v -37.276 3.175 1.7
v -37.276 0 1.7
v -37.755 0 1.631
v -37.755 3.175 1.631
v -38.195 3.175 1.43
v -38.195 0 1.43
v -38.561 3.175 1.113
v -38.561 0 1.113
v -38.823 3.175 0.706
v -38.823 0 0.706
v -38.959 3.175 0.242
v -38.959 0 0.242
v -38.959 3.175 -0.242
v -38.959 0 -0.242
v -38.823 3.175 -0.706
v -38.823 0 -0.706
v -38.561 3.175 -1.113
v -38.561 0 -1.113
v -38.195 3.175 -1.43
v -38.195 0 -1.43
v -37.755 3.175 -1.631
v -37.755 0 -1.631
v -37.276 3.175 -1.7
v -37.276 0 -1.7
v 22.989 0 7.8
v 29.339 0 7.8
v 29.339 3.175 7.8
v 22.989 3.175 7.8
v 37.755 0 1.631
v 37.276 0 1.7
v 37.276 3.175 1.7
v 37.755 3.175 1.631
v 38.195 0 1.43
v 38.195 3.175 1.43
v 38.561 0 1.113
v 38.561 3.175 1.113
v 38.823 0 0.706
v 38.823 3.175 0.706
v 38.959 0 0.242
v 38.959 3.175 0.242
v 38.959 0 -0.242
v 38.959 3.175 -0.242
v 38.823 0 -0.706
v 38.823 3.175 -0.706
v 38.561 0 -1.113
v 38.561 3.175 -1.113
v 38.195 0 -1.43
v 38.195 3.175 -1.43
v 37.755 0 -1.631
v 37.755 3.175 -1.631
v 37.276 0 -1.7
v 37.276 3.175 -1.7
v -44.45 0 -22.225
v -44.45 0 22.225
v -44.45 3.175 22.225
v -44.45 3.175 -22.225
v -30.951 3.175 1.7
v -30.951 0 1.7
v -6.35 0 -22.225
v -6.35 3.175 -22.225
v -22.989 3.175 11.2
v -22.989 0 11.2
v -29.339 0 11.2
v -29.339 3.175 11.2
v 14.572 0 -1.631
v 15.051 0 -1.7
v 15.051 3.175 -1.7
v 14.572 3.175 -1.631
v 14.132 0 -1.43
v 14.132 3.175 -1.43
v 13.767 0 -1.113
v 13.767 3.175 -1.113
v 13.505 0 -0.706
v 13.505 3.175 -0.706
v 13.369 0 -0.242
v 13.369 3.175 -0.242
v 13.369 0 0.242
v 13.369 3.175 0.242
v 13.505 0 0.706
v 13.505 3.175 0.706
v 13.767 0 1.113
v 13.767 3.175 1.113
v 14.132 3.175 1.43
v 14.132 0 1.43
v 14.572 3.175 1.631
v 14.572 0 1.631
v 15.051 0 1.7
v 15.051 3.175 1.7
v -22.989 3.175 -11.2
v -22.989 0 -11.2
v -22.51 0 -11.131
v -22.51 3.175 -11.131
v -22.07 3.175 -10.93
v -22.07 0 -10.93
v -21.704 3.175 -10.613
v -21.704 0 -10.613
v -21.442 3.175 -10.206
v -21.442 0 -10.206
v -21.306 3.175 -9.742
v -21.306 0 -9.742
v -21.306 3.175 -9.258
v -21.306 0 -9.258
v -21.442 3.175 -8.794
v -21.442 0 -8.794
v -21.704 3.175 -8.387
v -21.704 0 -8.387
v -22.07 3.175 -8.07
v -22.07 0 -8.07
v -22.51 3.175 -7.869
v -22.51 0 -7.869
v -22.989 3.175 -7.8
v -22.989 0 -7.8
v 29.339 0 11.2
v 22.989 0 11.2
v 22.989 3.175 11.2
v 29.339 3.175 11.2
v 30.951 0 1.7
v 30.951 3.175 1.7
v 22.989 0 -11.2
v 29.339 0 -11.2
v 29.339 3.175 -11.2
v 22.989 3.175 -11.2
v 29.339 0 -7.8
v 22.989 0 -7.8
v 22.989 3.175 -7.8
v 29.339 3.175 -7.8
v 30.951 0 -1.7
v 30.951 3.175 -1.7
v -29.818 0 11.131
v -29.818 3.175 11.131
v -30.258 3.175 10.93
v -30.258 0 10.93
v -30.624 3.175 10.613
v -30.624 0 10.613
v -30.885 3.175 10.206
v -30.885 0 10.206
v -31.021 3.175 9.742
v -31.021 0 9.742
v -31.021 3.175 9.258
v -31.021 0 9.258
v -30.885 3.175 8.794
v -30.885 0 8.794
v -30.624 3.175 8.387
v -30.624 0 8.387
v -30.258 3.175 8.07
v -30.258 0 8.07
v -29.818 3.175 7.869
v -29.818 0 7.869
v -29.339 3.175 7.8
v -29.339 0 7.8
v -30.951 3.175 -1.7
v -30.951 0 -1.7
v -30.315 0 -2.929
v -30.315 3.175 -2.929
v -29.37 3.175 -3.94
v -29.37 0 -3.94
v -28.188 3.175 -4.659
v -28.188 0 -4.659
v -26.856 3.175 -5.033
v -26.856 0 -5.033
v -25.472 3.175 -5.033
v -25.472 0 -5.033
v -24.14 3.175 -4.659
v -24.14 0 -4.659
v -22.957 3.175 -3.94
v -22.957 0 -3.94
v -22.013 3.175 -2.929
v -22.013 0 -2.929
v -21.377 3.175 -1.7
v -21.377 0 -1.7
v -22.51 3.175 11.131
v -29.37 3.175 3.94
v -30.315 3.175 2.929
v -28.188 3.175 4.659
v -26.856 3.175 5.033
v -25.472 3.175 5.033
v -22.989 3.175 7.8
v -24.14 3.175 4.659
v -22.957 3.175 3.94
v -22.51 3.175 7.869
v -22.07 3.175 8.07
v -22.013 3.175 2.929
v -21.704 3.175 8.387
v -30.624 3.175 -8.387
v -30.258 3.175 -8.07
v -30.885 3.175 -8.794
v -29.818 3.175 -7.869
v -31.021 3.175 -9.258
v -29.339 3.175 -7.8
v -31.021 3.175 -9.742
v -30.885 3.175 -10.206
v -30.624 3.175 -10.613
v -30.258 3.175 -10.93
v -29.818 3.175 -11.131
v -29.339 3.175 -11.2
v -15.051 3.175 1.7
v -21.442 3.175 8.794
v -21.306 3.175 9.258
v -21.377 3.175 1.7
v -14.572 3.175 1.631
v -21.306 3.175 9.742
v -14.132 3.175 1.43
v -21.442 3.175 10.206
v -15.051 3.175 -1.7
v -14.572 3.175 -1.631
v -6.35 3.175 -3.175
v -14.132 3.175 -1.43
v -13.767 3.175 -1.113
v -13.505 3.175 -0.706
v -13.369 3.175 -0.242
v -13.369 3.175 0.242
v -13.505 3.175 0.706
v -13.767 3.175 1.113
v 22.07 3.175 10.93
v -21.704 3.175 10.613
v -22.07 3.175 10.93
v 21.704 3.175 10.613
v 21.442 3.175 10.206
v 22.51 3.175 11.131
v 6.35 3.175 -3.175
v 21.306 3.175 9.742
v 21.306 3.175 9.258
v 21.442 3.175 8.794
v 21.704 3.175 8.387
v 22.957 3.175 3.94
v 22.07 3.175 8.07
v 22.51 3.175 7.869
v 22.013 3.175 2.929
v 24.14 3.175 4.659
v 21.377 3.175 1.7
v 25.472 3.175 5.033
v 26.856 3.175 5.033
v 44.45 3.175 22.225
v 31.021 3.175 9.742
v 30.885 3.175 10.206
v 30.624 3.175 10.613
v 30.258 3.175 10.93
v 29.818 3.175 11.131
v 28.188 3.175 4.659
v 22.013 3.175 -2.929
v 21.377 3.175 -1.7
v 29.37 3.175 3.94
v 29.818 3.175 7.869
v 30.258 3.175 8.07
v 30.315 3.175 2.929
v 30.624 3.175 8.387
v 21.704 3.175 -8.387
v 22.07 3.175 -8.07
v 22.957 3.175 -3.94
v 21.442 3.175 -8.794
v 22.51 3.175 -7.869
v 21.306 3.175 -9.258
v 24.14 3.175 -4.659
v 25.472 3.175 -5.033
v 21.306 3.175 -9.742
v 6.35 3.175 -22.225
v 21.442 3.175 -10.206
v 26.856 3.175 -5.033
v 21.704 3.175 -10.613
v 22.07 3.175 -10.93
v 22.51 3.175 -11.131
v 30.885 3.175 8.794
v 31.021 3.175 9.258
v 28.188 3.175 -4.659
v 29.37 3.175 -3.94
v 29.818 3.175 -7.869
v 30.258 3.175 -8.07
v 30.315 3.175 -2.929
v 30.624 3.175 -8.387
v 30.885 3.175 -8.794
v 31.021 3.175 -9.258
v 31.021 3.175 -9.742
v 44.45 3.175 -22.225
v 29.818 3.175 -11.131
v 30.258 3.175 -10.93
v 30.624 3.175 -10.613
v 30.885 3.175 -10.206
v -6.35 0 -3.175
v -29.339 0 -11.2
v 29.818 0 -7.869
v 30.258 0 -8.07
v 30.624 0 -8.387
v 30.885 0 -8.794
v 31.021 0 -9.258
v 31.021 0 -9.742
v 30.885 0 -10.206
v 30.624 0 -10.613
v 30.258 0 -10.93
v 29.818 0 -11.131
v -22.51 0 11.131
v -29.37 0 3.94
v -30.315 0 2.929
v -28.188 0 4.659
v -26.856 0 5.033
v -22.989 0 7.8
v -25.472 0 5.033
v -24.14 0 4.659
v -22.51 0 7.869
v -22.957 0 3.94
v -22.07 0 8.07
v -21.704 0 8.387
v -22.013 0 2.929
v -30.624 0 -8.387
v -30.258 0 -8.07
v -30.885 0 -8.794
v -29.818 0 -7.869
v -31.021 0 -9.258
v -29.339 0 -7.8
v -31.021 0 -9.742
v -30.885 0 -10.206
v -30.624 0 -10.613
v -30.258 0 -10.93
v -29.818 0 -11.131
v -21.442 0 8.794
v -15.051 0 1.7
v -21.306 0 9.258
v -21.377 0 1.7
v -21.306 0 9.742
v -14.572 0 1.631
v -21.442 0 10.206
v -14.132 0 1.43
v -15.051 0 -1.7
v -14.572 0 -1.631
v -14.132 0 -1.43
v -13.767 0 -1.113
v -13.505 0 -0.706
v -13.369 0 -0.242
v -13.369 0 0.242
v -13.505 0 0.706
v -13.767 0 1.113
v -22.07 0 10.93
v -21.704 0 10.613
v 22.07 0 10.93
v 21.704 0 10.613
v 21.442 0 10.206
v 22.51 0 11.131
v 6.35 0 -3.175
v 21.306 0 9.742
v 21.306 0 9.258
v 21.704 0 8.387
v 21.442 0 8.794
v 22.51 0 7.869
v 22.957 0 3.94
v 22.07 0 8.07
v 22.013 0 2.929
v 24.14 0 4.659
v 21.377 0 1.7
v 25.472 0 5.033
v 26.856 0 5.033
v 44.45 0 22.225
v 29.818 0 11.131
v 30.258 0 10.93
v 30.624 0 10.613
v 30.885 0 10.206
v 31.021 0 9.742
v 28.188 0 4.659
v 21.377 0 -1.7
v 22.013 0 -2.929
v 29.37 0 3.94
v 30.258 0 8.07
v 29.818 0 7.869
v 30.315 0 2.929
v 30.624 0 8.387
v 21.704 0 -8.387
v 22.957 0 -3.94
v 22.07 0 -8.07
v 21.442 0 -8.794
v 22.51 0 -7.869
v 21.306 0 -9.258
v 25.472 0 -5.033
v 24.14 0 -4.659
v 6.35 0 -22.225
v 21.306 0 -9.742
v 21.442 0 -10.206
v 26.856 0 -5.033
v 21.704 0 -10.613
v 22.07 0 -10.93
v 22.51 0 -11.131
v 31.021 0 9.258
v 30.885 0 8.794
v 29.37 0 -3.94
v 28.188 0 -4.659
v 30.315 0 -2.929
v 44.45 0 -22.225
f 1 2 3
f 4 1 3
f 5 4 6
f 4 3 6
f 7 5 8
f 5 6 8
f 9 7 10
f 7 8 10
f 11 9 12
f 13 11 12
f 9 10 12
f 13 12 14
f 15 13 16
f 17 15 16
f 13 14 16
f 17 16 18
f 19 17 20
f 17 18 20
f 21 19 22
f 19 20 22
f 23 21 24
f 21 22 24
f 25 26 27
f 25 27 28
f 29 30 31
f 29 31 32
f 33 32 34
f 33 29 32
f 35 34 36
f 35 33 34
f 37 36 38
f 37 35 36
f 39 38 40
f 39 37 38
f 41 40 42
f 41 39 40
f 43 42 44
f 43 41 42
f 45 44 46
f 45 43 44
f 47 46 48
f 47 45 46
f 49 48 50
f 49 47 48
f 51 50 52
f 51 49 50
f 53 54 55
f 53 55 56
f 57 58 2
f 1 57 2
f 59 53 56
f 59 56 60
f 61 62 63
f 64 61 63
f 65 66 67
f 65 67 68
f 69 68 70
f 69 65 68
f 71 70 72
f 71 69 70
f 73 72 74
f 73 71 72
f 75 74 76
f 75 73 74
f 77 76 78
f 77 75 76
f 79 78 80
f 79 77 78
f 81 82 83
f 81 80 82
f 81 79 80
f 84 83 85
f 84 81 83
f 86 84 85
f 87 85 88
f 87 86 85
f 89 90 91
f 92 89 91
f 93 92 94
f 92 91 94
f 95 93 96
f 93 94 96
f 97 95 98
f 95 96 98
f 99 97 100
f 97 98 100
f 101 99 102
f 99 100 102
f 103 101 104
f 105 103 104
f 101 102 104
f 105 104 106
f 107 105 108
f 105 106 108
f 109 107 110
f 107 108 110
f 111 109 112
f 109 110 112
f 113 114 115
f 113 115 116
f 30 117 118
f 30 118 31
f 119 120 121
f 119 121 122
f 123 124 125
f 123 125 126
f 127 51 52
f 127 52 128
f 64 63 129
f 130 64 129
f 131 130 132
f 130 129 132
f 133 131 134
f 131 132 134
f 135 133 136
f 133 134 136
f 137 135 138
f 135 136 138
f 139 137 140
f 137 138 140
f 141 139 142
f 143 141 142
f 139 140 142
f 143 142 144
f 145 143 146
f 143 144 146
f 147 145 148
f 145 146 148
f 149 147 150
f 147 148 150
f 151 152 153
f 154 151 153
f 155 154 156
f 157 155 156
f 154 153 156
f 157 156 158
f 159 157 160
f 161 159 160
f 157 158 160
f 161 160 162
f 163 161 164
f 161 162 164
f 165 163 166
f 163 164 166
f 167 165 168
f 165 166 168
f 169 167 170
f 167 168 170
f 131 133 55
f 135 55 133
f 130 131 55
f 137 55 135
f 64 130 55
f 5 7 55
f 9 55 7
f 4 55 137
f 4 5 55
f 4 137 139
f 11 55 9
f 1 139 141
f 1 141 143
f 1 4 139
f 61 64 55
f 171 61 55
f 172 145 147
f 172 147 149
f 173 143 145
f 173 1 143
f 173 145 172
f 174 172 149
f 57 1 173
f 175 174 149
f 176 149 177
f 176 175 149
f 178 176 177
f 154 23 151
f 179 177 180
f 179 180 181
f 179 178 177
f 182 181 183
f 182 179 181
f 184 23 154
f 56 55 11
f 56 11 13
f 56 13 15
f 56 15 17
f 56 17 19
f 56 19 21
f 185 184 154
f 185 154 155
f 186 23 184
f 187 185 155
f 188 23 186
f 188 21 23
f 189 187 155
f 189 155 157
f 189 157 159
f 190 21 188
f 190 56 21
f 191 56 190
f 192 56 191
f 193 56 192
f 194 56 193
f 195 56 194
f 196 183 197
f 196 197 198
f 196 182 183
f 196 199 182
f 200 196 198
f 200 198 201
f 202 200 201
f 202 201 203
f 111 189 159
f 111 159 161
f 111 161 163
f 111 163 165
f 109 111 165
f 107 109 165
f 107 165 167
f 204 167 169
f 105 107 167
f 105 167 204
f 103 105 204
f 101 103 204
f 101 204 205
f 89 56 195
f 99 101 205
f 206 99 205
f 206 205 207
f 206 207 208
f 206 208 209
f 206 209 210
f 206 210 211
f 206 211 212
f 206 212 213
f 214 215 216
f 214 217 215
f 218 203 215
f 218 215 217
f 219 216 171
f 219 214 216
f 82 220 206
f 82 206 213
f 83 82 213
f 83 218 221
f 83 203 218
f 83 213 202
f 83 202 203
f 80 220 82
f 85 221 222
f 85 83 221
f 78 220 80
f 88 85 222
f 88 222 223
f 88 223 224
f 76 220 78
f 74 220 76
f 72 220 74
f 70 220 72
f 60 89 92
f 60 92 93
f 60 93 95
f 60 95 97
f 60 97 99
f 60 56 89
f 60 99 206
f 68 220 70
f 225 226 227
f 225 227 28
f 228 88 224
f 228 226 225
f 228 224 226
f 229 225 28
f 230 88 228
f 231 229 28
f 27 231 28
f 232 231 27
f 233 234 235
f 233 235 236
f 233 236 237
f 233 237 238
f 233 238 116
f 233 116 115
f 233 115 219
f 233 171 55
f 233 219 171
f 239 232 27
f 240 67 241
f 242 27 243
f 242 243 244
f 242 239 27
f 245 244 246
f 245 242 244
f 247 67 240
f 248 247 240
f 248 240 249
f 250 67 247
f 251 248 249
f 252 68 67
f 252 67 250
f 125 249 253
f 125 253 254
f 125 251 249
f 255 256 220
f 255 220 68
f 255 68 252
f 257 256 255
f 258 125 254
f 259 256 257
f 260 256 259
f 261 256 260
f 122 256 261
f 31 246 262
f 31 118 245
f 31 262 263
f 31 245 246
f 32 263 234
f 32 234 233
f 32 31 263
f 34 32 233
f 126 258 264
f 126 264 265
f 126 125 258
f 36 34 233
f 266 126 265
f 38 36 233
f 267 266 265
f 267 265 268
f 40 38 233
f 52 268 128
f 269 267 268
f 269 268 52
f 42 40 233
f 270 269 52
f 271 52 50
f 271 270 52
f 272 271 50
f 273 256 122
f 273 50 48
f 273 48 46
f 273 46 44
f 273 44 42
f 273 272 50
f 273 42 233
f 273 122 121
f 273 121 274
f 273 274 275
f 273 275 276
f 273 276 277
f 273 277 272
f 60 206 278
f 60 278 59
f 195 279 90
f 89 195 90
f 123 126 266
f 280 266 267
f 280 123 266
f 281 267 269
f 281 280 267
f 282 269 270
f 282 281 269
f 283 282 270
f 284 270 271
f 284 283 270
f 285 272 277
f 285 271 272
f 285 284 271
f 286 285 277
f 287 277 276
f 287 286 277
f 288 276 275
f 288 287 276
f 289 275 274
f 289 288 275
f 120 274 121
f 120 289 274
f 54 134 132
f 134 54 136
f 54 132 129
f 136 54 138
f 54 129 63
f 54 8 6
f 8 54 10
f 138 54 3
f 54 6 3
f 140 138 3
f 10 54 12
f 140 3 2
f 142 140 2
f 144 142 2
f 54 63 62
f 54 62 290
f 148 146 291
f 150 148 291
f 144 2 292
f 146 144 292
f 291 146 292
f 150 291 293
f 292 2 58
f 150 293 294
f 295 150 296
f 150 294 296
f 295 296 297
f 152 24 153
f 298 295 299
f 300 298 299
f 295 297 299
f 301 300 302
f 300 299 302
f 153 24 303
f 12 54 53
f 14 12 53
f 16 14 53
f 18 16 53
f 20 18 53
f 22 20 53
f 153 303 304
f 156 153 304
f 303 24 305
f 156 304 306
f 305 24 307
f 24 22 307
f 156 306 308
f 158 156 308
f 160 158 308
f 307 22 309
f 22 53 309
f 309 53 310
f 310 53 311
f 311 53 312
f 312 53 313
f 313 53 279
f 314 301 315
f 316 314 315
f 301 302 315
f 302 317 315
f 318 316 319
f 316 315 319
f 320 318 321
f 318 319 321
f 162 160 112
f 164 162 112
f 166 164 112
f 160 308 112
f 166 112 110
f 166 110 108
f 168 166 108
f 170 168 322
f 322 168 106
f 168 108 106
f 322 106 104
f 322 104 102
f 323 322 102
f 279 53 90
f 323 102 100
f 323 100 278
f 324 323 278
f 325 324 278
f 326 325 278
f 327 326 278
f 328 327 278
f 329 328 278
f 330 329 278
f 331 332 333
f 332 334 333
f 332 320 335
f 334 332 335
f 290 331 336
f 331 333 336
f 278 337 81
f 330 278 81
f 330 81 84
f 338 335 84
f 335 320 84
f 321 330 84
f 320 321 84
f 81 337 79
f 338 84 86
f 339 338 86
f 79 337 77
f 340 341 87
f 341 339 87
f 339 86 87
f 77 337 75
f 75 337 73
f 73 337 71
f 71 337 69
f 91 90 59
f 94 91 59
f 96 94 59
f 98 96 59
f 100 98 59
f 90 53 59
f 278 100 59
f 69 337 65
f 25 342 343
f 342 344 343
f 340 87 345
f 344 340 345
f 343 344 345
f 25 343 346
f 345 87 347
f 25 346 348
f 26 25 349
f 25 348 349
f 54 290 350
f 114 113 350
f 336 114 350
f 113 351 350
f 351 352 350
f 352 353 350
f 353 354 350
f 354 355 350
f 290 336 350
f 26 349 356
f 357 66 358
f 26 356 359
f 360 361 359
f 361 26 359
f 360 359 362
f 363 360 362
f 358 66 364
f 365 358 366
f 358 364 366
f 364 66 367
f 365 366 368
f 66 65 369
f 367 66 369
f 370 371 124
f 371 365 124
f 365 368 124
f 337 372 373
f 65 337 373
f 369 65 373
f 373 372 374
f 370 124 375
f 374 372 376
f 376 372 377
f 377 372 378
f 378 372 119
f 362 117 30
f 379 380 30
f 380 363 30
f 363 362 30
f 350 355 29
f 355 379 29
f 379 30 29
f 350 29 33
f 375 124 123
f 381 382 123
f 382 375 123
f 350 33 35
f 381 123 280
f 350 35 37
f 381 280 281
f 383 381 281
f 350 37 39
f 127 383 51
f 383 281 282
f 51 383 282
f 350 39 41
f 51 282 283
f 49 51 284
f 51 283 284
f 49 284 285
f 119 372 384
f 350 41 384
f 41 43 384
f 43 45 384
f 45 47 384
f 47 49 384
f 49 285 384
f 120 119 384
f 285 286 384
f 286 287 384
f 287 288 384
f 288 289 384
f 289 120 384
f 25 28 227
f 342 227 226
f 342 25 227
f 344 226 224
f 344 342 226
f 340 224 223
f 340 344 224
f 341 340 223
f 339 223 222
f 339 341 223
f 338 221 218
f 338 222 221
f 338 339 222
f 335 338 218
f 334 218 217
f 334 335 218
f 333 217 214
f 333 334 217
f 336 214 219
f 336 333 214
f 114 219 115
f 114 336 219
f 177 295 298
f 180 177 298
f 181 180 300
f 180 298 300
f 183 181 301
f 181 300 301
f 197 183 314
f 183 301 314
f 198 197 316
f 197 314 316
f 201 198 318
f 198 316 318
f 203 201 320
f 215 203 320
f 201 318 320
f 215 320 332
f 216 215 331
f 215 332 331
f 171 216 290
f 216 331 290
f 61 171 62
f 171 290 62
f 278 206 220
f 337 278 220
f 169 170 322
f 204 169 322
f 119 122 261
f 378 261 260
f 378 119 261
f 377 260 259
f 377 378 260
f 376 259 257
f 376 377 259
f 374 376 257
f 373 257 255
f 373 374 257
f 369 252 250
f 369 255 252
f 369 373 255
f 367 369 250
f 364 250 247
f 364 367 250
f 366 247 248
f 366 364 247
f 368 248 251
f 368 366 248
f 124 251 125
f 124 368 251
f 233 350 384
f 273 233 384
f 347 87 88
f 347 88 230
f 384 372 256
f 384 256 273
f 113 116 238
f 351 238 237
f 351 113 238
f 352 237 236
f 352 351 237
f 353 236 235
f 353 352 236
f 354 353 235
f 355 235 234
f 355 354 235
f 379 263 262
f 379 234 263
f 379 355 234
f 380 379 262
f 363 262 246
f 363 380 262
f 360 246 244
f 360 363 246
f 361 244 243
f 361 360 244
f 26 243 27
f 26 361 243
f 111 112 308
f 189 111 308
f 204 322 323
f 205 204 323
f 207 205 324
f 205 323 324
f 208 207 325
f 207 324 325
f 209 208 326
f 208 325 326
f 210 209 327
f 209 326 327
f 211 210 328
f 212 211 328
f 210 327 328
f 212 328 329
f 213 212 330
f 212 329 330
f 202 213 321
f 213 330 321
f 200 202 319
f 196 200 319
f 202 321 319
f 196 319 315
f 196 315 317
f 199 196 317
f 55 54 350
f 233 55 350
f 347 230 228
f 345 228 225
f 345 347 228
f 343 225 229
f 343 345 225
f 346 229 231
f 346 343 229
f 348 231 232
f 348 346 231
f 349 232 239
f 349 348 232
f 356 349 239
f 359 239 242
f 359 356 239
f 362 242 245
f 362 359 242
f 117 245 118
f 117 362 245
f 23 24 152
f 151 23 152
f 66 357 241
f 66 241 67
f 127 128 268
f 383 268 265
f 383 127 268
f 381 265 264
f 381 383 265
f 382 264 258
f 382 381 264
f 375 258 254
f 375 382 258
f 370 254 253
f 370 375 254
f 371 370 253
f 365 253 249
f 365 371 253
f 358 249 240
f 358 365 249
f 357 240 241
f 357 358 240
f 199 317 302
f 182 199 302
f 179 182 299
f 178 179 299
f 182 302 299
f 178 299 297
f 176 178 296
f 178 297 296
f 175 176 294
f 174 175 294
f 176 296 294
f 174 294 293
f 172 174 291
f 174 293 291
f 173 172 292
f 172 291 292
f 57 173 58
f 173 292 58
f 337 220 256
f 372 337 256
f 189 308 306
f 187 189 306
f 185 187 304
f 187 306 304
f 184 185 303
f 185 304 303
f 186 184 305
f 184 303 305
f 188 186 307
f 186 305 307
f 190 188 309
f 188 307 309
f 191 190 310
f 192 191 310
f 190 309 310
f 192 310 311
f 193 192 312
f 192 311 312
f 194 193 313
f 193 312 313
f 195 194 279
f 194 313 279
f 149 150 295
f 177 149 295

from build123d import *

# Parameters (mm, degrees)
SKETCH1_W           = 88.9
SKETCH1_H           = 44.45
BOSS_EXTRUDE1_DEPTH = 3.175
CUT_EXTRUDE1_DEPTH  = 50.797929174
SKETCH7_W           = 12.7
SKETCH7_H           = 19.05
CUT_EXTRUDE2_DEPTH  = 50.797929174


with BuildPart() as part:
    # Sketch1 → Boss-Extrude1 (new body)
    with BuildSketch(Plane(origin=(0, 0, 0), x_dir=(1, 0, 0), z_dir=(0, 1, 0))):
        Rectangle(SKETCH1_W, SKETCH1_H)
    extrude(amount=BOSS_EXTRUDE1_DEPTH)

    # Sketch3 → Cut-Extrude1 (cut, through all)
    with BuildSketch(Plane.XZ):
        with BuildLine():
            Line((-22.9888034, 11.2), (-29.3388034, 11.2))
            ThreePointArc((-29.3388034, 11.2), (-31.0388034, 9.5), (-29.3388034, 7.8))
            Line((-29.3388034, 7.8), (-22.9888034, 7.8))
            ThreePointArc((-22.9888034, 7.8), (-21.2888034, 9.5), (-22.9888034, 11.2))
        make_face()
        with BuildLine():
            Line((-30.950911086, 1.7), (-37.2763034, 1.7))
            ThreePointArc((-37.2763034, 1.7), (-38.9763034, 0), (-37.2763034, -1.7))
            Line((-37.2763034, -1.7), (-30.950911086, -1.7))
            ThreePointArc((-30.950911086, -1.7), (-31.2438034, 0), (-30.950911086, 1.7))
        make_face()
        with BuildLine():
            Line((-21.376695714, 1.7), (-30.950911086, 1.7))
            ThreePointArc((-30.950911086, 1.7), (-31.2438034, 0), (-30.950911086, -1.7))
            Line((-30.950911086, -1.7), (-21.376695714, -1.7))
            ThreePointArc((-21.376695714, -1.7), (-21.157561943, -0.86252332), (-21.0838034, 0))
            ThreePointArc((-21.0838034, 0), (-21.157561943, 0.86252332), (-21.376695714, 1.7))
        make_face()
        with BuildLine():
            ThreePointArc((-21.376695714, 1.7), (-26.1638034, 5.08), (-30.950911086, 1.7))
            Line((-30.950911086, 1.7), (-21.376695714, 1.7))
        make_face()
        with BuildLine():
            Line((-15.0513034, 1.7), (-21.376695714, 1.7))
            ThreePointArc((-21.376695714, 1.7), (-21.157561943, 0.86252332), (-21.0838034, 0))
            ThreePointArc((-21.0838034, 0), (-21.157561943, -0.86252332), (-21.376695714, -1.7))
            Line((-21.376695714, -1.7), (-15.0513034, -1.7))
            ThreePointArc((-15.0513034, -1.7), (-13.3513034, 0), (-15.0513034, 1.7))
        make_face()
        with BuildLine():
            Line((-21.376695714, -1.7), (-30.950911086, -1.7))
            ThreePointArc((-30.950911086, -1.7), (-26.1638034, -5.08), (-21.376695714, -1.7))
        make_face()
        with BuildLine():
            Line((-29.3388034, -11.2), (-22.9888034, -11.2))
            ThreePointArc((-22.9888034, -11.2), (-21.2888034, -9.5), (-22.9888034, -7.8))
            Line((-22.9888034, -7.8), (-29.3388034, -7.8))
            ThreePointArc((-29.3388034, -7.8), (-31.0388034, -9.5), (-29.3388034, -11.2))
        make_face()
    cut_extrude1 = extrude(amount=-CUT_EXTRUDE1_DEPTH, mode=Mode.SUBTRACT)

    # Mirror1: Cut-Extrude1 across plane
    add(cut_extrude1.mirror(Plane(origin=(0, 0, 0), x_dir=(0, 0, 1), z_dir=(1, 0, 0))), mode=Mode.SUBTRACT)

    # Sketch7 → Cut-Extrude2 (cut, through all)
    with BuildSketch(Plane(origin=(0, 3.175, 0), x_dir=(1, 0, 0), z_dir=(0, 1, 0))):
        with Locations((0, 12.7)):
            Rectangle(SKETCH7_W, SKETCH7_H)
    extrude(amount=-CUT_EXTRUDE2_DEPTH, mode=Mode.SUBTRACT)


solid = part.part
